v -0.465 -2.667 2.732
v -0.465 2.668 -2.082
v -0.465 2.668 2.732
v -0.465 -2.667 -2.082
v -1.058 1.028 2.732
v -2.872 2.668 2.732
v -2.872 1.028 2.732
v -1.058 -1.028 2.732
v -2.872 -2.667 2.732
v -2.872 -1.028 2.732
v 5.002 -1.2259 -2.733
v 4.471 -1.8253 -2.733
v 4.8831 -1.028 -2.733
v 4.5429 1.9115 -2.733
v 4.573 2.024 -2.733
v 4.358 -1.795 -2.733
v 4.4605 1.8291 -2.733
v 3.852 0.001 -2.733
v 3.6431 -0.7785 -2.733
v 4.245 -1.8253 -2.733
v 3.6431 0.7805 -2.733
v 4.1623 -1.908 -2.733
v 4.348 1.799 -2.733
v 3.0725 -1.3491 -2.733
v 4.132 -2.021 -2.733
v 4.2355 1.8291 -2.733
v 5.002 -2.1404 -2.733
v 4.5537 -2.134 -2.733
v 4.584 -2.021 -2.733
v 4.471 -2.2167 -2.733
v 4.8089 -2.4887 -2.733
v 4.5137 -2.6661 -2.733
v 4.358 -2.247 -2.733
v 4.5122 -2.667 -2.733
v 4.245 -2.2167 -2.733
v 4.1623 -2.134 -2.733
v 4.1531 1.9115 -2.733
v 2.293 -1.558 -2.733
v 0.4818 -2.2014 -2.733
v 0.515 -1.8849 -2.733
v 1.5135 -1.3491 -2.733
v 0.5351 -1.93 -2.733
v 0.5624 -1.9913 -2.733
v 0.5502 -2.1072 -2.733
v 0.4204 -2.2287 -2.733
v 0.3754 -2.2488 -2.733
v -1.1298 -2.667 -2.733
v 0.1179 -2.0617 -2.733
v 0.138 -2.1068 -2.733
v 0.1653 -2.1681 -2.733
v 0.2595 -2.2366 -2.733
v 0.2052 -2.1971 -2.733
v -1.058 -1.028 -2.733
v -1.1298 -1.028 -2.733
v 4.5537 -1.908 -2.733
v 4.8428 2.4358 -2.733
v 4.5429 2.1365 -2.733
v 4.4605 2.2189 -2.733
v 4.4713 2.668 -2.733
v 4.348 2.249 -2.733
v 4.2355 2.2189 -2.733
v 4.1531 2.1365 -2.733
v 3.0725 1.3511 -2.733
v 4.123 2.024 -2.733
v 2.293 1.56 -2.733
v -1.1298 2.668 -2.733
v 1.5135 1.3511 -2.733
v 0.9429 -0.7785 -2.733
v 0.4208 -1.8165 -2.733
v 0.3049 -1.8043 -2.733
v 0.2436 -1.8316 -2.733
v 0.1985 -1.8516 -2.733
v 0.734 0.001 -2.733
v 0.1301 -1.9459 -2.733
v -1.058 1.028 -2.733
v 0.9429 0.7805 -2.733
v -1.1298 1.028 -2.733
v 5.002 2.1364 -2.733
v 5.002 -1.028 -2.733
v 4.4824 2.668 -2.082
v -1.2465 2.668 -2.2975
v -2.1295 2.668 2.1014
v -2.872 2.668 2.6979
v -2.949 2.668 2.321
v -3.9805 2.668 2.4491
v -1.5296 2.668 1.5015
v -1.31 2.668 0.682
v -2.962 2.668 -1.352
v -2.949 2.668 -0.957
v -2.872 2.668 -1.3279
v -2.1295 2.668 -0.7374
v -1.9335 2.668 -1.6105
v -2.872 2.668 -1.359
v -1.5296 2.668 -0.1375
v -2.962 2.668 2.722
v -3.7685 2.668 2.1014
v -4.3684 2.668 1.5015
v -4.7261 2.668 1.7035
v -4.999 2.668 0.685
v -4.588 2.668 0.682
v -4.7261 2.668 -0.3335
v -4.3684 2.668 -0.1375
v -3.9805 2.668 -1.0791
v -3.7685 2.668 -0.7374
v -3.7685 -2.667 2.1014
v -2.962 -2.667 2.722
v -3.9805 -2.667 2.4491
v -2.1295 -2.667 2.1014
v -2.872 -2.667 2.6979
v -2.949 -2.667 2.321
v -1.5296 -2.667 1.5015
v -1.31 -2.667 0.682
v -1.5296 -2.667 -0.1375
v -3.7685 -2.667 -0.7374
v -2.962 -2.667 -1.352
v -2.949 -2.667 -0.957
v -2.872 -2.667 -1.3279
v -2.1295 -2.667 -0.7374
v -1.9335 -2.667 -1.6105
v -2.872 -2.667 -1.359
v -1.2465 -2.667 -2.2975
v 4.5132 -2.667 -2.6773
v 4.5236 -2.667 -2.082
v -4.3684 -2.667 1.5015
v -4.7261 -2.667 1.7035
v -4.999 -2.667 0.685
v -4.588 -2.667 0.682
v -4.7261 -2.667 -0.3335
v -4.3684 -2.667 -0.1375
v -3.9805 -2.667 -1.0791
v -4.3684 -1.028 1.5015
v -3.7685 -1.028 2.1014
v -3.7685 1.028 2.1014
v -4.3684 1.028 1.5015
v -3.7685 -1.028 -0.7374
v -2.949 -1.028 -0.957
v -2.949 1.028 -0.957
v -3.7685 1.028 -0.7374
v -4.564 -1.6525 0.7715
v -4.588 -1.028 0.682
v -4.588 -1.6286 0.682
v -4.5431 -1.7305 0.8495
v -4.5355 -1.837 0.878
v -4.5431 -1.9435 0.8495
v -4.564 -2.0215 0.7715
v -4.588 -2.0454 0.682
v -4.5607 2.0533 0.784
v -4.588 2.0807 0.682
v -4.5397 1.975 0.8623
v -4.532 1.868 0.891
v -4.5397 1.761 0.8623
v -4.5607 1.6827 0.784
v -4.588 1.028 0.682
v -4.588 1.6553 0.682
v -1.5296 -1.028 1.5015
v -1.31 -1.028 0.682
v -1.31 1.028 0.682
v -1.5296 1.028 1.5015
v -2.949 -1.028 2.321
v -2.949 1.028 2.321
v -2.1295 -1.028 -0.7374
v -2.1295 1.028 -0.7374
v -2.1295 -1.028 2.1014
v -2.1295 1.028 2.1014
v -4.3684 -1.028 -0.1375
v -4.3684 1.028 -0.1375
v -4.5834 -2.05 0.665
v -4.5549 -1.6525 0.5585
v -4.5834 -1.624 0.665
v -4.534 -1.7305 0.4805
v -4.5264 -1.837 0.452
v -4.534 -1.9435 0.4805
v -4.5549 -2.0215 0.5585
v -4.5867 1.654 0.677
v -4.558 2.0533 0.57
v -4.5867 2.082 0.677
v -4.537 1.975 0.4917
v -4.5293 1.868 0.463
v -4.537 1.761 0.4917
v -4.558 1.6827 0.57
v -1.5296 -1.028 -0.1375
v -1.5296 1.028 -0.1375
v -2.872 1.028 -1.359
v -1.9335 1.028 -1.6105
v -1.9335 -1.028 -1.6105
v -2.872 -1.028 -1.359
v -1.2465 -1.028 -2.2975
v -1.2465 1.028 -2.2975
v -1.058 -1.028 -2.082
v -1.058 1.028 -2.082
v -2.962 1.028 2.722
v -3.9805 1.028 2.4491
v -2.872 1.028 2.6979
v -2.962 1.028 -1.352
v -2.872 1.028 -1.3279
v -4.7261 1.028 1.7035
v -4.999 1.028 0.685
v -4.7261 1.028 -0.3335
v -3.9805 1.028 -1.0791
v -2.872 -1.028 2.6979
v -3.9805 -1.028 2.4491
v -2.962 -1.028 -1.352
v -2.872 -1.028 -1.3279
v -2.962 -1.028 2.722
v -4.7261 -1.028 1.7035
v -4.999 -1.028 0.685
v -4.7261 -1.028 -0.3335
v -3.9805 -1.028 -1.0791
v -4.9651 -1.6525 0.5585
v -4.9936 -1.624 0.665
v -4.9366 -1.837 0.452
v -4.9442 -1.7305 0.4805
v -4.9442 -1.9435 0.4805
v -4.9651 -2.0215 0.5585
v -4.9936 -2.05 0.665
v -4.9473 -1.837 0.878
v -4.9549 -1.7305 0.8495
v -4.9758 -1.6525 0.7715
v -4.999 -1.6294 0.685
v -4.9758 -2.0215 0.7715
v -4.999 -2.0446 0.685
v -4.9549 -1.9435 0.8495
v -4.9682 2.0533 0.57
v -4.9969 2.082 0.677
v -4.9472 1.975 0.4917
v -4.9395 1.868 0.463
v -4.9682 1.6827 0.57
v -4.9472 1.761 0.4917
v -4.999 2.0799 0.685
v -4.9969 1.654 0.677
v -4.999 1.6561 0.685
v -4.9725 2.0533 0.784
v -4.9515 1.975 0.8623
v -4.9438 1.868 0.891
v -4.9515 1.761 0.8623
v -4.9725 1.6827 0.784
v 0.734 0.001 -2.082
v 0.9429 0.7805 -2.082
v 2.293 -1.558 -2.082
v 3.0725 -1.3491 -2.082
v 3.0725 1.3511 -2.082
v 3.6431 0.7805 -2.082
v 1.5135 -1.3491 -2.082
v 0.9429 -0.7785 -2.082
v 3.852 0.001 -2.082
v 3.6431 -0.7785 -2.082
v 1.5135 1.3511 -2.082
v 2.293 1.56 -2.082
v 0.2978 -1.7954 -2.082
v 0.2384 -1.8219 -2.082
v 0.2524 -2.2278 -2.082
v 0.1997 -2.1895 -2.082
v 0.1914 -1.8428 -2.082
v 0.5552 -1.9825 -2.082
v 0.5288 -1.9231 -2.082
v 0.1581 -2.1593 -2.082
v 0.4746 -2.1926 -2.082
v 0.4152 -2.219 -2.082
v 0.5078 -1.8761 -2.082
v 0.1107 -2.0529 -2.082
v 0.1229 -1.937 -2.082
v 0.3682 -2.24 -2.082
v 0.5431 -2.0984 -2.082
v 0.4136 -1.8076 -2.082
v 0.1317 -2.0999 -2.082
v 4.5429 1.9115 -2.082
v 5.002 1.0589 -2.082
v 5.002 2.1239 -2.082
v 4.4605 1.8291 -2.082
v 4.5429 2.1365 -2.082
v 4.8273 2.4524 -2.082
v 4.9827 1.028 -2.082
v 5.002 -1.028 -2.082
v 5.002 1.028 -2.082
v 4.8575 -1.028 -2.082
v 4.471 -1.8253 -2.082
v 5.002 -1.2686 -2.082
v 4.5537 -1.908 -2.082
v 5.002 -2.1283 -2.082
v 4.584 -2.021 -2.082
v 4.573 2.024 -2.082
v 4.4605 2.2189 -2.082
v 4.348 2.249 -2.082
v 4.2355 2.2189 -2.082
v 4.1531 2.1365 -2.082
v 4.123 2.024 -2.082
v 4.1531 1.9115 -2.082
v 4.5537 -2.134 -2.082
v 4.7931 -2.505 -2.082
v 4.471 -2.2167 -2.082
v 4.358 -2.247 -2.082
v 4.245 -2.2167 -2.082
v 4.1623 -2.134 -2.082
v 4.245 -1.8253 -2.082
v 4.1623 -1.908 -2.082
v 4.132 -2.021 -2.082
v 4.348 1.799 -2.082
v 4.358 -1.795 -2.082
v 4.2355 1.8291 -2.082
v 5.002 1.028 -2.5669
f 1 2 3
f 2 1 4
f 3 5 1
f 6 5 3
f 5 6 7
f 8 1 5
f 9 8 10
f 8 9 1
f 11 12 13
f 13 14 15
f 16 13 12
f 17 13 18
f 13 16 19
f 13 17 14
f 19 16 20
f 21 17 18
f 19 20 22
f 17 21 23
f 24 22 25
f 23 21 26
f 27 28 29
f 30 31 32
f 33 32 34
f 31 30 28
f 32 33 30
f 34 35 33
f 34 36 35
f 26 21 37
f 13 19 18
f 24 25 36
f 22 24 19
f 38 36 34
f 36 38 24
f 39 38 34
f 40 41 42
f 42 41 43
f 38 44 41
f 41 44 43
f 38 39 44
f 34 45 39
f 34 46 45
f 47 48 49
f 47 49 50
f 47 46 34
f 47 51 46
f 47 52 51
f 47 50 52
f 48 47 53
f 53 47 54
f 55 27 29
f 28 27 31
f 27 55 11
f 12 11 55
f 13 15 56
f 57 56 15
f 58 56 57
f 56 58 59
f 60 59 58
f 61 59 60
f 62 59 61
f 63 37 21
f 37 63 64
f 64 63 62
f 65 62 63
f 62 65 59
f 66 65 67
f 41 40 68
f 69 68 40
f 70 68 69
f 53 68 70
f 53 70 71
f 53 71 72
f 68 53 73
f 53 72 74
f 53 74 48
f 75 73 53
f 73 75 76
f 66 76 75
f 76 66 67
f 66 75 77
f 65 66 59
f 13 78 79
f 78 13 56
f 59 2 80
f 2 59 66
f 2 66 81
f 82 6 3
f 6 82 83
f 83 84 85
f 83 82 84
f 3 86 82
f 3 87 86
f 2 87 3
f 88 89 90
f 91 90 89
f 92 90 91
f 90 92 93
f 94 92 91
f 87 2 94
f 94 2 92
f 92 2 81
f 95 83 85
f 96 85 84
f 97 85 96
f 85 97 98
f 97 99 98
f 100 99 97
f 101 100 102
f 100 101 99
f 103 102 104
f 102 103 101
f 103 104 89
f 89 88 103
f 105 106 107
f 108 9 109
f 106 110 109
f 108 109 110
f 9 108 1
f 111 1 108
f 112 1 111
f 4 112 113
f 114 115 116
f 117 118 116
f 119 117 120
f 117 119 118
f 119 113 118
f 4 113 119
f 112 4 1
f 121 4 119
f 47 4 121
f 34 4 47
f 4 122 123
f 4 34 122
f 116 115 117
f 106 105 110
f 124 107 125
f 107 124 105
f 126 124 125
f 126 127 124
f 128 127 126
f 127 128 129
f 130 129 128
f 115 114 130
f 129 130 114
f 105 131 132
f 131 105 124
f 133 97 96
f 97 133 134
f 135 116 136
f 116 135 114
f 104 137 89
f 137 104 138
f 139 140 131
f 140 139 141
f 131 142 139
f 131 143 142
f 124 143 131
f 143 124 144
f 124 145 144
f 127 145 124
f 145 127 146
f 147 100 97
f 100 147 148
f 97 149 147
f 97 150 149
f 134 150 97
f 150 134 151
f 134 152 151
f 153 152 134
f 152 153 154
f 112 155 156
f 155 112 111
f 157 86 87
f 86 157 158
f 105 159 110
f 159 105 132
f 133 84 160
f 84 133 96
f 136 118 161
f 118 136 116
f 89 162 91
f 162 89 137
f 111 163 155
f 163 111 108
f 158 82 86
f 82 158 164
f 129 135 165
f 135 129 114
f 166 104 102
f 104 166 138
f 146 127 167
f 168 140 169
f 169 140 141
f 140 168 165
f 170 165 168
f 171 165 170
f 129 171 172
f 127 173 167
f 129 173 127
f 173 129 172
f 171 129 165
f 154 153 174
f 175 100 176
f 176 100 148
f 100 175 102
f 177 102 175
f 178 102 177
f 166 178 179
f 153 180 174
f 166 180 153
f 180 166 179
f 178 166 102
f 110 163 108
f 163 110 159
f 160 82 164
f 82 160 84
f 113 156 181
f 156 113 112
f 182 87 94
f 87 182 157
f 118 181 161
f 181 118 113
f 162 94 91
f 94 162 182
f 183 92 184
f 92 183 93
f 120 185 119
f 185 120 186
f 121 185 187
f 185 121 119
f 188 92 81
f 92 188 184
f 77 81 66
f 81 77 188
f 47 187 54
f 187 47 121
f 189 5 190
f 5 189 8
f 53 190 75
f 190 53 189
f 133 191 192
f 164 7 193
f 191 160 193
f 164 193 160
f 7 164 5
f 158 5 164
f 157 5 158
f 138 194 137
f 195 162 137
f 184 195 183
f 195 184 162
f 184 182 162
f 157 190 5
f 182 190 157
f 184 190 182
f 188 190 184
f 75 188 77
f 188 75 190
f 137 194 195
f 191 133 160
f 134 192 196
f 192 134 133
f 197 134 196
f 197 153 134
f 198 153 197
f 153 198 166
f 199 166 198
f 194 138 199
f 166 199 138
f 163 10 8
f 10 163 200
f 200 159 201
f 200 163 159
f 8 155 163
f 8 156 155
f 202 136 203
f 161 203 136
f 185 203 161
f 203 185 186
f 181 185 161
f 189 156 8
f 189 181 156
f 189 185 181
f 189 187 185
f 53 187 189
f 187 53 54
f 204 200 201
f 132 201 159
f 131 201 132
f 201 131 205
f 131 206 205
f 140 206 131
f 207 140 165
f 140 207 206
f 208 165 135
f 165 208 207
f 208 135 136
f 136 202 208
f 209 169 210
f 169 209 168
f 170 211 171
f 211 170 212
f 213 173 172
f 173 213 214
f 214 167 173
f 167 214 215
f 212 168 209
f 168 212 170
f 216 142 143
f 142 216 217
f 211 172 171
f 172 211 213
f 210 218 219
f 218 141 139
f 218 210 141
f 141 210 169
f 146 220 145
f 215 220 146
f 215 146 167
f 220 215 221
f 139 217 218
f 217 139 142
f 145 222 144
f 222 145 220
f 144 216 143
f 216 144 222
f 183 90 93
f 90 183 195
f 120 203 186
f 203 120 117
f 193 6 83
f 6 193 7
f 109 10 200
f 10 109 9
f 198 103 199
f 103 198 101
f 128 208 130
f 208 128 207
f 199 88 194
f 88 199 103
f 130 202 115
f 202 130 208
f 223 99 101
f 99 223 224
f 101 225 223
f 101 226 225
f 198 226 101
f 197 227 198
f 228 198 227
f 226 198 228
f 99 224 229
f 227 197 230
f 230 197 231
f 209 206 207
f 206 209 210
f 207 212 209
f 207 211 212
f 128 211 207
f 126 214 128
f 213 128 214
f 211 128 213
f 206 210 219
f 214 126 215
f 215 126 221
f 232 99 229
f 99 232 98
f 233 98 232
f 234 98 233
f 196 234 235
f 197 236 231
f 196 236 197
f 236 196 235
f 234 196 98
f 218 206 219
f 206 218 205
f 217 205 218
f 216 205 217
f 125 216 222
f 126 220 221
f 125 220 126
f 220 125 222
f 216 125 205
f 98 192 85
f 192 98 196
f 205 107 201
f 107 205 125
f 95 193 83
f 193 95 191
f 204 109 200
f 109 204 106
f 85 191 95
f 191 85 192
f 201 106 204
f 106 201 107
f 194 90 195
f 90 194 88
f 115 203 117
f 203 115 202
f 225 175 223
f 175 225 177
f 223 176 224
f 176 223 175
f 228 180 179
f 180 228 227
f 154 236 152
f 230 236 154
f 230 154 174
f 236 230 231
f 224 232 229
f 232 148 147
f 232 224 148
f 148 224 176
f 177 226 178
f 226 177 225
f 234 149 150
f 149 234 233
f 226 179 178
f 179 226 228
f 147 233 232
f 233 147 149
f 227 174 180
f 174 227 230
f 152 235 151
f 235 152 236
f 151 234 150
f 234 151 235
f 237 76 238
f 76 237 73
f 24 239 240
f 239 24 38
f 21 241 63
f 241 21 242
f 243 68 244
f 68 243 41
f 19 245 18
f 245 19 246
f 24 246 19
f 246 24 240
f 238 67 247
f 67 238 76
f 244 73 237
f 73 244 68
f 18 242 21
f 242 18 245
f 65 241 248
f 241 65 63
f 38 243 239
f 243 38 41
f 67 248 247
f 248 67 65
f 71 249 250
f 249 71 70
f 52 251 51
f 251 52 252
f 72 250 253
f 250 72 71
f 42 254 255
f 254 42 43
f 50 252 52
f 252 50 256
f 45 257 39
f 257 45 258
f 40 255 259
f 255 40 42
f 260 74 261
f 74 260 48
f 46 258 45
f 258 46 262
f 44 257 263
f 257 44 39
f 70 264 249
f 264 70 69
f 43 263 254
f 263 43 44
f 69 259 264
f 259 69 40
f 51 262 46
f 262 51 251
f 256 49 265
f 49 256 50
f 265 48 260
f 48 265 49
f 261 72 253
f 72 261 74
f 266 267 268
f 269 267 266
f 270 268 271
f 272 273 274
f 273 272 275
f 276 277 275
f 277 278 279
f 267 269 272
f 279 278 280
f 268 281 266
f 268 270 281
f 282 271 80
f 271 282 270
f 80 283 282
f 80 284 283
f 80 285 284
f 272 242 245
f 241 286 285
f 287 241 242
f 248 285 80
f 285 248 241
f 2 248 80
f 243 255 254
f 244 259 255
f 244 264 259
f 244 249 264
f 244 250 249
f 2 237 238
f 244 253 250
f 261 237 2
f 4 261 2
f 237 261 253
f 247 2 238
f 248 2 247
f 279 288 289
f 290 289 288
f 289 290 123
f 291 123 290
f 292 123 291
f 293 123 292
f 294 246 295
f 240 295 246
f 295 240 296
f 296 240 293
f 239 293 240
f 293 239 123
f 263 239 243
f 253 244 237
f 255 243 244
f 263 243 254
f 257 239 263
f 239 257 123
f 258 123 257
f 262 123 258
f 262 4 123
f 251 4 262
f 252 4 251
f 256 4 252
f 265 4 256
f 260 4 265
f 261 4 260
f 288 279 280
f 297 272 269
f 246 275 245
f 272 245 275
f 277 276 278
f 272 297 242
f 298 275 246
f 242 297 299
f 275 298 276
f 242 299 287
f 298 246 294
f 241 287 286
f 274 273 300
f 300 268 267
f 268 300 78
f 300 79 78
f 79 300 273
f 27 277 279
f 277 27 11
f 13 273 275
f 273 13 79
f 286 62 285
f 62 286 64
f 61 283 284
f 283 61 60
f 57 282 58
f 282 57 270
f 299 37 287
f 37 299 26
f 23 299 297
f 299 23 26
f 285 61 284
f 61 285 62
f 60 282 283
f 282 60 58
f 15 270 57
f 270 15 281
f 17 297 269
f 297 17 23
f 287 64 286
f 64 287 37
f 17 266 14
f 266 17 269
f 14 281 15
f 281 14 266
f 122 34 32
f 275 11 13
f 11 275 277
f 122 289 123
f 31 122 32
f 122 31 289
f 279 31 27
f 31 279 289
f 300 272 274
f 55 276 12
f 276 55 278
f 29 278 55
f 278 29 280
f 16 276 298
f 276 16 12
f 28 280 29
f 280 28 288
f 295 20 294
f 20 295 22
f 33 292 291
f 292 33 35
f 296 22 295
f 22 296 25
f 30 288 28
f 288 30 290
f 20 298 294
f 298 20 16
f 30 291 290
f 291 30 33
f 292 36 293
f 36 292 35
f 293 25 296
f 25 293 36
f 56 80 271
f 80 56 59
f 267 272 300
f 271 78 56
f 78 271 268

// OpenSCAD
intersection() {
translate([-6, -3.201, -3.279]) cube(size = [12, 6.402, 6.558], center = false);
union() {
difference() {
difference() {
difference() {
difference() {
translate([-18.1, -2.667, -2.733]) cube(size = [17.635, 5.335, 5.465], center = false);
rotate([180, 90, -90])
translate([-0.682, 2.949, -2.667])
cylinder(h = 20.767, r1 = 1.639, r2 = 1.639, center = false, $fn = 12);
}
union() {
rotate([180, 90, -90])
translate([3.236, 2.872, -2.667])
cylinder(h = 5.335, r1 = 1.877, r2 = 1.877, center = false, $fn = 12);
translate([-18.1, -1.028, -2.733]) cube(size = [17.042, 2.056, 5.465], center = false);
}
}
rotate([-180, 90, -180])
translate([-0.665, -1.837, -18.1])
cylinder(h = 15.228, r1 = 0.213, r2 = 0.213, center = false, $fn = 12);
}
union() {
difference() {
translate([-18.1, -18.1, -2.733]) cube(size = [15.228, 36.2, 5.465], center = false);
rotate([180, 90, -90])
translate([-0.685, 2.962, -18.1])
cylinder(h = 36.2, r1 = 2.037, r2 = 2.037, center = false, $fn = 12);
}
rotate([180, 90, -180])
translate([-0.677, 1.868, -18.1])
cylinder(h = 15.228, r1 = 0.214, r2 = 0.214, center = false, $fn = 12);
}
}
difference() {
translate([-1.058, -2.667, -2.733]) cube(size = [4.919, 5.335, 0.651], center = false);
union() {
rotate([180, 0, 180])
translate([-2.293, 0.001, -18.1])
cylinder(h = 36.2, r1 = 1.559, r2 = 1.559, center = false, $fn = 12);
rotate([-180, 1, 129])
translate([-1.741, -1.011, -18.1])
cylinder(h = 36.2, r1 = 0.225, r2 = 0.225, center = false, $fn = 12);
}
}
intersection() {
union() {
difference() {
translate([3.861, -1.028, -2.733]) cube(size = [1.141, 3.696, 0.651], center = false);
rotate([180, 0, 180])
translate([-4.348, 2.024, -18.1])
cylinder(h = 20.833, r1 = 0.225, r2 = 0.225, center = false, $fn = 12);
}
rotate([-180, 2, -134])
translate([-1.454, -4.035, -18.1])
cylinder(h = 36.2, r1 = 1.153, r2 = 1.153, center = false, $fn = 12);
}
union() {
rotate([180, 2, 133])
translate([-1.425, 3.95, -18.1])
cylinder(h = 36.2, r1 = 1.253, r2 = 1.253, center = false, $fn = 12);
difference() {
translate([3.861, -2.667, -2.733]) cube(size = [1.141, 3.695, 0.651], center = false);
rotate([0, 0, 0])
translate([4.358, -2.021, -18.1])
cylinder(h = 36.2, r1 = 0.226, r2 = 0.226, center = false, $fn = 12);
}
}
}
}
}
